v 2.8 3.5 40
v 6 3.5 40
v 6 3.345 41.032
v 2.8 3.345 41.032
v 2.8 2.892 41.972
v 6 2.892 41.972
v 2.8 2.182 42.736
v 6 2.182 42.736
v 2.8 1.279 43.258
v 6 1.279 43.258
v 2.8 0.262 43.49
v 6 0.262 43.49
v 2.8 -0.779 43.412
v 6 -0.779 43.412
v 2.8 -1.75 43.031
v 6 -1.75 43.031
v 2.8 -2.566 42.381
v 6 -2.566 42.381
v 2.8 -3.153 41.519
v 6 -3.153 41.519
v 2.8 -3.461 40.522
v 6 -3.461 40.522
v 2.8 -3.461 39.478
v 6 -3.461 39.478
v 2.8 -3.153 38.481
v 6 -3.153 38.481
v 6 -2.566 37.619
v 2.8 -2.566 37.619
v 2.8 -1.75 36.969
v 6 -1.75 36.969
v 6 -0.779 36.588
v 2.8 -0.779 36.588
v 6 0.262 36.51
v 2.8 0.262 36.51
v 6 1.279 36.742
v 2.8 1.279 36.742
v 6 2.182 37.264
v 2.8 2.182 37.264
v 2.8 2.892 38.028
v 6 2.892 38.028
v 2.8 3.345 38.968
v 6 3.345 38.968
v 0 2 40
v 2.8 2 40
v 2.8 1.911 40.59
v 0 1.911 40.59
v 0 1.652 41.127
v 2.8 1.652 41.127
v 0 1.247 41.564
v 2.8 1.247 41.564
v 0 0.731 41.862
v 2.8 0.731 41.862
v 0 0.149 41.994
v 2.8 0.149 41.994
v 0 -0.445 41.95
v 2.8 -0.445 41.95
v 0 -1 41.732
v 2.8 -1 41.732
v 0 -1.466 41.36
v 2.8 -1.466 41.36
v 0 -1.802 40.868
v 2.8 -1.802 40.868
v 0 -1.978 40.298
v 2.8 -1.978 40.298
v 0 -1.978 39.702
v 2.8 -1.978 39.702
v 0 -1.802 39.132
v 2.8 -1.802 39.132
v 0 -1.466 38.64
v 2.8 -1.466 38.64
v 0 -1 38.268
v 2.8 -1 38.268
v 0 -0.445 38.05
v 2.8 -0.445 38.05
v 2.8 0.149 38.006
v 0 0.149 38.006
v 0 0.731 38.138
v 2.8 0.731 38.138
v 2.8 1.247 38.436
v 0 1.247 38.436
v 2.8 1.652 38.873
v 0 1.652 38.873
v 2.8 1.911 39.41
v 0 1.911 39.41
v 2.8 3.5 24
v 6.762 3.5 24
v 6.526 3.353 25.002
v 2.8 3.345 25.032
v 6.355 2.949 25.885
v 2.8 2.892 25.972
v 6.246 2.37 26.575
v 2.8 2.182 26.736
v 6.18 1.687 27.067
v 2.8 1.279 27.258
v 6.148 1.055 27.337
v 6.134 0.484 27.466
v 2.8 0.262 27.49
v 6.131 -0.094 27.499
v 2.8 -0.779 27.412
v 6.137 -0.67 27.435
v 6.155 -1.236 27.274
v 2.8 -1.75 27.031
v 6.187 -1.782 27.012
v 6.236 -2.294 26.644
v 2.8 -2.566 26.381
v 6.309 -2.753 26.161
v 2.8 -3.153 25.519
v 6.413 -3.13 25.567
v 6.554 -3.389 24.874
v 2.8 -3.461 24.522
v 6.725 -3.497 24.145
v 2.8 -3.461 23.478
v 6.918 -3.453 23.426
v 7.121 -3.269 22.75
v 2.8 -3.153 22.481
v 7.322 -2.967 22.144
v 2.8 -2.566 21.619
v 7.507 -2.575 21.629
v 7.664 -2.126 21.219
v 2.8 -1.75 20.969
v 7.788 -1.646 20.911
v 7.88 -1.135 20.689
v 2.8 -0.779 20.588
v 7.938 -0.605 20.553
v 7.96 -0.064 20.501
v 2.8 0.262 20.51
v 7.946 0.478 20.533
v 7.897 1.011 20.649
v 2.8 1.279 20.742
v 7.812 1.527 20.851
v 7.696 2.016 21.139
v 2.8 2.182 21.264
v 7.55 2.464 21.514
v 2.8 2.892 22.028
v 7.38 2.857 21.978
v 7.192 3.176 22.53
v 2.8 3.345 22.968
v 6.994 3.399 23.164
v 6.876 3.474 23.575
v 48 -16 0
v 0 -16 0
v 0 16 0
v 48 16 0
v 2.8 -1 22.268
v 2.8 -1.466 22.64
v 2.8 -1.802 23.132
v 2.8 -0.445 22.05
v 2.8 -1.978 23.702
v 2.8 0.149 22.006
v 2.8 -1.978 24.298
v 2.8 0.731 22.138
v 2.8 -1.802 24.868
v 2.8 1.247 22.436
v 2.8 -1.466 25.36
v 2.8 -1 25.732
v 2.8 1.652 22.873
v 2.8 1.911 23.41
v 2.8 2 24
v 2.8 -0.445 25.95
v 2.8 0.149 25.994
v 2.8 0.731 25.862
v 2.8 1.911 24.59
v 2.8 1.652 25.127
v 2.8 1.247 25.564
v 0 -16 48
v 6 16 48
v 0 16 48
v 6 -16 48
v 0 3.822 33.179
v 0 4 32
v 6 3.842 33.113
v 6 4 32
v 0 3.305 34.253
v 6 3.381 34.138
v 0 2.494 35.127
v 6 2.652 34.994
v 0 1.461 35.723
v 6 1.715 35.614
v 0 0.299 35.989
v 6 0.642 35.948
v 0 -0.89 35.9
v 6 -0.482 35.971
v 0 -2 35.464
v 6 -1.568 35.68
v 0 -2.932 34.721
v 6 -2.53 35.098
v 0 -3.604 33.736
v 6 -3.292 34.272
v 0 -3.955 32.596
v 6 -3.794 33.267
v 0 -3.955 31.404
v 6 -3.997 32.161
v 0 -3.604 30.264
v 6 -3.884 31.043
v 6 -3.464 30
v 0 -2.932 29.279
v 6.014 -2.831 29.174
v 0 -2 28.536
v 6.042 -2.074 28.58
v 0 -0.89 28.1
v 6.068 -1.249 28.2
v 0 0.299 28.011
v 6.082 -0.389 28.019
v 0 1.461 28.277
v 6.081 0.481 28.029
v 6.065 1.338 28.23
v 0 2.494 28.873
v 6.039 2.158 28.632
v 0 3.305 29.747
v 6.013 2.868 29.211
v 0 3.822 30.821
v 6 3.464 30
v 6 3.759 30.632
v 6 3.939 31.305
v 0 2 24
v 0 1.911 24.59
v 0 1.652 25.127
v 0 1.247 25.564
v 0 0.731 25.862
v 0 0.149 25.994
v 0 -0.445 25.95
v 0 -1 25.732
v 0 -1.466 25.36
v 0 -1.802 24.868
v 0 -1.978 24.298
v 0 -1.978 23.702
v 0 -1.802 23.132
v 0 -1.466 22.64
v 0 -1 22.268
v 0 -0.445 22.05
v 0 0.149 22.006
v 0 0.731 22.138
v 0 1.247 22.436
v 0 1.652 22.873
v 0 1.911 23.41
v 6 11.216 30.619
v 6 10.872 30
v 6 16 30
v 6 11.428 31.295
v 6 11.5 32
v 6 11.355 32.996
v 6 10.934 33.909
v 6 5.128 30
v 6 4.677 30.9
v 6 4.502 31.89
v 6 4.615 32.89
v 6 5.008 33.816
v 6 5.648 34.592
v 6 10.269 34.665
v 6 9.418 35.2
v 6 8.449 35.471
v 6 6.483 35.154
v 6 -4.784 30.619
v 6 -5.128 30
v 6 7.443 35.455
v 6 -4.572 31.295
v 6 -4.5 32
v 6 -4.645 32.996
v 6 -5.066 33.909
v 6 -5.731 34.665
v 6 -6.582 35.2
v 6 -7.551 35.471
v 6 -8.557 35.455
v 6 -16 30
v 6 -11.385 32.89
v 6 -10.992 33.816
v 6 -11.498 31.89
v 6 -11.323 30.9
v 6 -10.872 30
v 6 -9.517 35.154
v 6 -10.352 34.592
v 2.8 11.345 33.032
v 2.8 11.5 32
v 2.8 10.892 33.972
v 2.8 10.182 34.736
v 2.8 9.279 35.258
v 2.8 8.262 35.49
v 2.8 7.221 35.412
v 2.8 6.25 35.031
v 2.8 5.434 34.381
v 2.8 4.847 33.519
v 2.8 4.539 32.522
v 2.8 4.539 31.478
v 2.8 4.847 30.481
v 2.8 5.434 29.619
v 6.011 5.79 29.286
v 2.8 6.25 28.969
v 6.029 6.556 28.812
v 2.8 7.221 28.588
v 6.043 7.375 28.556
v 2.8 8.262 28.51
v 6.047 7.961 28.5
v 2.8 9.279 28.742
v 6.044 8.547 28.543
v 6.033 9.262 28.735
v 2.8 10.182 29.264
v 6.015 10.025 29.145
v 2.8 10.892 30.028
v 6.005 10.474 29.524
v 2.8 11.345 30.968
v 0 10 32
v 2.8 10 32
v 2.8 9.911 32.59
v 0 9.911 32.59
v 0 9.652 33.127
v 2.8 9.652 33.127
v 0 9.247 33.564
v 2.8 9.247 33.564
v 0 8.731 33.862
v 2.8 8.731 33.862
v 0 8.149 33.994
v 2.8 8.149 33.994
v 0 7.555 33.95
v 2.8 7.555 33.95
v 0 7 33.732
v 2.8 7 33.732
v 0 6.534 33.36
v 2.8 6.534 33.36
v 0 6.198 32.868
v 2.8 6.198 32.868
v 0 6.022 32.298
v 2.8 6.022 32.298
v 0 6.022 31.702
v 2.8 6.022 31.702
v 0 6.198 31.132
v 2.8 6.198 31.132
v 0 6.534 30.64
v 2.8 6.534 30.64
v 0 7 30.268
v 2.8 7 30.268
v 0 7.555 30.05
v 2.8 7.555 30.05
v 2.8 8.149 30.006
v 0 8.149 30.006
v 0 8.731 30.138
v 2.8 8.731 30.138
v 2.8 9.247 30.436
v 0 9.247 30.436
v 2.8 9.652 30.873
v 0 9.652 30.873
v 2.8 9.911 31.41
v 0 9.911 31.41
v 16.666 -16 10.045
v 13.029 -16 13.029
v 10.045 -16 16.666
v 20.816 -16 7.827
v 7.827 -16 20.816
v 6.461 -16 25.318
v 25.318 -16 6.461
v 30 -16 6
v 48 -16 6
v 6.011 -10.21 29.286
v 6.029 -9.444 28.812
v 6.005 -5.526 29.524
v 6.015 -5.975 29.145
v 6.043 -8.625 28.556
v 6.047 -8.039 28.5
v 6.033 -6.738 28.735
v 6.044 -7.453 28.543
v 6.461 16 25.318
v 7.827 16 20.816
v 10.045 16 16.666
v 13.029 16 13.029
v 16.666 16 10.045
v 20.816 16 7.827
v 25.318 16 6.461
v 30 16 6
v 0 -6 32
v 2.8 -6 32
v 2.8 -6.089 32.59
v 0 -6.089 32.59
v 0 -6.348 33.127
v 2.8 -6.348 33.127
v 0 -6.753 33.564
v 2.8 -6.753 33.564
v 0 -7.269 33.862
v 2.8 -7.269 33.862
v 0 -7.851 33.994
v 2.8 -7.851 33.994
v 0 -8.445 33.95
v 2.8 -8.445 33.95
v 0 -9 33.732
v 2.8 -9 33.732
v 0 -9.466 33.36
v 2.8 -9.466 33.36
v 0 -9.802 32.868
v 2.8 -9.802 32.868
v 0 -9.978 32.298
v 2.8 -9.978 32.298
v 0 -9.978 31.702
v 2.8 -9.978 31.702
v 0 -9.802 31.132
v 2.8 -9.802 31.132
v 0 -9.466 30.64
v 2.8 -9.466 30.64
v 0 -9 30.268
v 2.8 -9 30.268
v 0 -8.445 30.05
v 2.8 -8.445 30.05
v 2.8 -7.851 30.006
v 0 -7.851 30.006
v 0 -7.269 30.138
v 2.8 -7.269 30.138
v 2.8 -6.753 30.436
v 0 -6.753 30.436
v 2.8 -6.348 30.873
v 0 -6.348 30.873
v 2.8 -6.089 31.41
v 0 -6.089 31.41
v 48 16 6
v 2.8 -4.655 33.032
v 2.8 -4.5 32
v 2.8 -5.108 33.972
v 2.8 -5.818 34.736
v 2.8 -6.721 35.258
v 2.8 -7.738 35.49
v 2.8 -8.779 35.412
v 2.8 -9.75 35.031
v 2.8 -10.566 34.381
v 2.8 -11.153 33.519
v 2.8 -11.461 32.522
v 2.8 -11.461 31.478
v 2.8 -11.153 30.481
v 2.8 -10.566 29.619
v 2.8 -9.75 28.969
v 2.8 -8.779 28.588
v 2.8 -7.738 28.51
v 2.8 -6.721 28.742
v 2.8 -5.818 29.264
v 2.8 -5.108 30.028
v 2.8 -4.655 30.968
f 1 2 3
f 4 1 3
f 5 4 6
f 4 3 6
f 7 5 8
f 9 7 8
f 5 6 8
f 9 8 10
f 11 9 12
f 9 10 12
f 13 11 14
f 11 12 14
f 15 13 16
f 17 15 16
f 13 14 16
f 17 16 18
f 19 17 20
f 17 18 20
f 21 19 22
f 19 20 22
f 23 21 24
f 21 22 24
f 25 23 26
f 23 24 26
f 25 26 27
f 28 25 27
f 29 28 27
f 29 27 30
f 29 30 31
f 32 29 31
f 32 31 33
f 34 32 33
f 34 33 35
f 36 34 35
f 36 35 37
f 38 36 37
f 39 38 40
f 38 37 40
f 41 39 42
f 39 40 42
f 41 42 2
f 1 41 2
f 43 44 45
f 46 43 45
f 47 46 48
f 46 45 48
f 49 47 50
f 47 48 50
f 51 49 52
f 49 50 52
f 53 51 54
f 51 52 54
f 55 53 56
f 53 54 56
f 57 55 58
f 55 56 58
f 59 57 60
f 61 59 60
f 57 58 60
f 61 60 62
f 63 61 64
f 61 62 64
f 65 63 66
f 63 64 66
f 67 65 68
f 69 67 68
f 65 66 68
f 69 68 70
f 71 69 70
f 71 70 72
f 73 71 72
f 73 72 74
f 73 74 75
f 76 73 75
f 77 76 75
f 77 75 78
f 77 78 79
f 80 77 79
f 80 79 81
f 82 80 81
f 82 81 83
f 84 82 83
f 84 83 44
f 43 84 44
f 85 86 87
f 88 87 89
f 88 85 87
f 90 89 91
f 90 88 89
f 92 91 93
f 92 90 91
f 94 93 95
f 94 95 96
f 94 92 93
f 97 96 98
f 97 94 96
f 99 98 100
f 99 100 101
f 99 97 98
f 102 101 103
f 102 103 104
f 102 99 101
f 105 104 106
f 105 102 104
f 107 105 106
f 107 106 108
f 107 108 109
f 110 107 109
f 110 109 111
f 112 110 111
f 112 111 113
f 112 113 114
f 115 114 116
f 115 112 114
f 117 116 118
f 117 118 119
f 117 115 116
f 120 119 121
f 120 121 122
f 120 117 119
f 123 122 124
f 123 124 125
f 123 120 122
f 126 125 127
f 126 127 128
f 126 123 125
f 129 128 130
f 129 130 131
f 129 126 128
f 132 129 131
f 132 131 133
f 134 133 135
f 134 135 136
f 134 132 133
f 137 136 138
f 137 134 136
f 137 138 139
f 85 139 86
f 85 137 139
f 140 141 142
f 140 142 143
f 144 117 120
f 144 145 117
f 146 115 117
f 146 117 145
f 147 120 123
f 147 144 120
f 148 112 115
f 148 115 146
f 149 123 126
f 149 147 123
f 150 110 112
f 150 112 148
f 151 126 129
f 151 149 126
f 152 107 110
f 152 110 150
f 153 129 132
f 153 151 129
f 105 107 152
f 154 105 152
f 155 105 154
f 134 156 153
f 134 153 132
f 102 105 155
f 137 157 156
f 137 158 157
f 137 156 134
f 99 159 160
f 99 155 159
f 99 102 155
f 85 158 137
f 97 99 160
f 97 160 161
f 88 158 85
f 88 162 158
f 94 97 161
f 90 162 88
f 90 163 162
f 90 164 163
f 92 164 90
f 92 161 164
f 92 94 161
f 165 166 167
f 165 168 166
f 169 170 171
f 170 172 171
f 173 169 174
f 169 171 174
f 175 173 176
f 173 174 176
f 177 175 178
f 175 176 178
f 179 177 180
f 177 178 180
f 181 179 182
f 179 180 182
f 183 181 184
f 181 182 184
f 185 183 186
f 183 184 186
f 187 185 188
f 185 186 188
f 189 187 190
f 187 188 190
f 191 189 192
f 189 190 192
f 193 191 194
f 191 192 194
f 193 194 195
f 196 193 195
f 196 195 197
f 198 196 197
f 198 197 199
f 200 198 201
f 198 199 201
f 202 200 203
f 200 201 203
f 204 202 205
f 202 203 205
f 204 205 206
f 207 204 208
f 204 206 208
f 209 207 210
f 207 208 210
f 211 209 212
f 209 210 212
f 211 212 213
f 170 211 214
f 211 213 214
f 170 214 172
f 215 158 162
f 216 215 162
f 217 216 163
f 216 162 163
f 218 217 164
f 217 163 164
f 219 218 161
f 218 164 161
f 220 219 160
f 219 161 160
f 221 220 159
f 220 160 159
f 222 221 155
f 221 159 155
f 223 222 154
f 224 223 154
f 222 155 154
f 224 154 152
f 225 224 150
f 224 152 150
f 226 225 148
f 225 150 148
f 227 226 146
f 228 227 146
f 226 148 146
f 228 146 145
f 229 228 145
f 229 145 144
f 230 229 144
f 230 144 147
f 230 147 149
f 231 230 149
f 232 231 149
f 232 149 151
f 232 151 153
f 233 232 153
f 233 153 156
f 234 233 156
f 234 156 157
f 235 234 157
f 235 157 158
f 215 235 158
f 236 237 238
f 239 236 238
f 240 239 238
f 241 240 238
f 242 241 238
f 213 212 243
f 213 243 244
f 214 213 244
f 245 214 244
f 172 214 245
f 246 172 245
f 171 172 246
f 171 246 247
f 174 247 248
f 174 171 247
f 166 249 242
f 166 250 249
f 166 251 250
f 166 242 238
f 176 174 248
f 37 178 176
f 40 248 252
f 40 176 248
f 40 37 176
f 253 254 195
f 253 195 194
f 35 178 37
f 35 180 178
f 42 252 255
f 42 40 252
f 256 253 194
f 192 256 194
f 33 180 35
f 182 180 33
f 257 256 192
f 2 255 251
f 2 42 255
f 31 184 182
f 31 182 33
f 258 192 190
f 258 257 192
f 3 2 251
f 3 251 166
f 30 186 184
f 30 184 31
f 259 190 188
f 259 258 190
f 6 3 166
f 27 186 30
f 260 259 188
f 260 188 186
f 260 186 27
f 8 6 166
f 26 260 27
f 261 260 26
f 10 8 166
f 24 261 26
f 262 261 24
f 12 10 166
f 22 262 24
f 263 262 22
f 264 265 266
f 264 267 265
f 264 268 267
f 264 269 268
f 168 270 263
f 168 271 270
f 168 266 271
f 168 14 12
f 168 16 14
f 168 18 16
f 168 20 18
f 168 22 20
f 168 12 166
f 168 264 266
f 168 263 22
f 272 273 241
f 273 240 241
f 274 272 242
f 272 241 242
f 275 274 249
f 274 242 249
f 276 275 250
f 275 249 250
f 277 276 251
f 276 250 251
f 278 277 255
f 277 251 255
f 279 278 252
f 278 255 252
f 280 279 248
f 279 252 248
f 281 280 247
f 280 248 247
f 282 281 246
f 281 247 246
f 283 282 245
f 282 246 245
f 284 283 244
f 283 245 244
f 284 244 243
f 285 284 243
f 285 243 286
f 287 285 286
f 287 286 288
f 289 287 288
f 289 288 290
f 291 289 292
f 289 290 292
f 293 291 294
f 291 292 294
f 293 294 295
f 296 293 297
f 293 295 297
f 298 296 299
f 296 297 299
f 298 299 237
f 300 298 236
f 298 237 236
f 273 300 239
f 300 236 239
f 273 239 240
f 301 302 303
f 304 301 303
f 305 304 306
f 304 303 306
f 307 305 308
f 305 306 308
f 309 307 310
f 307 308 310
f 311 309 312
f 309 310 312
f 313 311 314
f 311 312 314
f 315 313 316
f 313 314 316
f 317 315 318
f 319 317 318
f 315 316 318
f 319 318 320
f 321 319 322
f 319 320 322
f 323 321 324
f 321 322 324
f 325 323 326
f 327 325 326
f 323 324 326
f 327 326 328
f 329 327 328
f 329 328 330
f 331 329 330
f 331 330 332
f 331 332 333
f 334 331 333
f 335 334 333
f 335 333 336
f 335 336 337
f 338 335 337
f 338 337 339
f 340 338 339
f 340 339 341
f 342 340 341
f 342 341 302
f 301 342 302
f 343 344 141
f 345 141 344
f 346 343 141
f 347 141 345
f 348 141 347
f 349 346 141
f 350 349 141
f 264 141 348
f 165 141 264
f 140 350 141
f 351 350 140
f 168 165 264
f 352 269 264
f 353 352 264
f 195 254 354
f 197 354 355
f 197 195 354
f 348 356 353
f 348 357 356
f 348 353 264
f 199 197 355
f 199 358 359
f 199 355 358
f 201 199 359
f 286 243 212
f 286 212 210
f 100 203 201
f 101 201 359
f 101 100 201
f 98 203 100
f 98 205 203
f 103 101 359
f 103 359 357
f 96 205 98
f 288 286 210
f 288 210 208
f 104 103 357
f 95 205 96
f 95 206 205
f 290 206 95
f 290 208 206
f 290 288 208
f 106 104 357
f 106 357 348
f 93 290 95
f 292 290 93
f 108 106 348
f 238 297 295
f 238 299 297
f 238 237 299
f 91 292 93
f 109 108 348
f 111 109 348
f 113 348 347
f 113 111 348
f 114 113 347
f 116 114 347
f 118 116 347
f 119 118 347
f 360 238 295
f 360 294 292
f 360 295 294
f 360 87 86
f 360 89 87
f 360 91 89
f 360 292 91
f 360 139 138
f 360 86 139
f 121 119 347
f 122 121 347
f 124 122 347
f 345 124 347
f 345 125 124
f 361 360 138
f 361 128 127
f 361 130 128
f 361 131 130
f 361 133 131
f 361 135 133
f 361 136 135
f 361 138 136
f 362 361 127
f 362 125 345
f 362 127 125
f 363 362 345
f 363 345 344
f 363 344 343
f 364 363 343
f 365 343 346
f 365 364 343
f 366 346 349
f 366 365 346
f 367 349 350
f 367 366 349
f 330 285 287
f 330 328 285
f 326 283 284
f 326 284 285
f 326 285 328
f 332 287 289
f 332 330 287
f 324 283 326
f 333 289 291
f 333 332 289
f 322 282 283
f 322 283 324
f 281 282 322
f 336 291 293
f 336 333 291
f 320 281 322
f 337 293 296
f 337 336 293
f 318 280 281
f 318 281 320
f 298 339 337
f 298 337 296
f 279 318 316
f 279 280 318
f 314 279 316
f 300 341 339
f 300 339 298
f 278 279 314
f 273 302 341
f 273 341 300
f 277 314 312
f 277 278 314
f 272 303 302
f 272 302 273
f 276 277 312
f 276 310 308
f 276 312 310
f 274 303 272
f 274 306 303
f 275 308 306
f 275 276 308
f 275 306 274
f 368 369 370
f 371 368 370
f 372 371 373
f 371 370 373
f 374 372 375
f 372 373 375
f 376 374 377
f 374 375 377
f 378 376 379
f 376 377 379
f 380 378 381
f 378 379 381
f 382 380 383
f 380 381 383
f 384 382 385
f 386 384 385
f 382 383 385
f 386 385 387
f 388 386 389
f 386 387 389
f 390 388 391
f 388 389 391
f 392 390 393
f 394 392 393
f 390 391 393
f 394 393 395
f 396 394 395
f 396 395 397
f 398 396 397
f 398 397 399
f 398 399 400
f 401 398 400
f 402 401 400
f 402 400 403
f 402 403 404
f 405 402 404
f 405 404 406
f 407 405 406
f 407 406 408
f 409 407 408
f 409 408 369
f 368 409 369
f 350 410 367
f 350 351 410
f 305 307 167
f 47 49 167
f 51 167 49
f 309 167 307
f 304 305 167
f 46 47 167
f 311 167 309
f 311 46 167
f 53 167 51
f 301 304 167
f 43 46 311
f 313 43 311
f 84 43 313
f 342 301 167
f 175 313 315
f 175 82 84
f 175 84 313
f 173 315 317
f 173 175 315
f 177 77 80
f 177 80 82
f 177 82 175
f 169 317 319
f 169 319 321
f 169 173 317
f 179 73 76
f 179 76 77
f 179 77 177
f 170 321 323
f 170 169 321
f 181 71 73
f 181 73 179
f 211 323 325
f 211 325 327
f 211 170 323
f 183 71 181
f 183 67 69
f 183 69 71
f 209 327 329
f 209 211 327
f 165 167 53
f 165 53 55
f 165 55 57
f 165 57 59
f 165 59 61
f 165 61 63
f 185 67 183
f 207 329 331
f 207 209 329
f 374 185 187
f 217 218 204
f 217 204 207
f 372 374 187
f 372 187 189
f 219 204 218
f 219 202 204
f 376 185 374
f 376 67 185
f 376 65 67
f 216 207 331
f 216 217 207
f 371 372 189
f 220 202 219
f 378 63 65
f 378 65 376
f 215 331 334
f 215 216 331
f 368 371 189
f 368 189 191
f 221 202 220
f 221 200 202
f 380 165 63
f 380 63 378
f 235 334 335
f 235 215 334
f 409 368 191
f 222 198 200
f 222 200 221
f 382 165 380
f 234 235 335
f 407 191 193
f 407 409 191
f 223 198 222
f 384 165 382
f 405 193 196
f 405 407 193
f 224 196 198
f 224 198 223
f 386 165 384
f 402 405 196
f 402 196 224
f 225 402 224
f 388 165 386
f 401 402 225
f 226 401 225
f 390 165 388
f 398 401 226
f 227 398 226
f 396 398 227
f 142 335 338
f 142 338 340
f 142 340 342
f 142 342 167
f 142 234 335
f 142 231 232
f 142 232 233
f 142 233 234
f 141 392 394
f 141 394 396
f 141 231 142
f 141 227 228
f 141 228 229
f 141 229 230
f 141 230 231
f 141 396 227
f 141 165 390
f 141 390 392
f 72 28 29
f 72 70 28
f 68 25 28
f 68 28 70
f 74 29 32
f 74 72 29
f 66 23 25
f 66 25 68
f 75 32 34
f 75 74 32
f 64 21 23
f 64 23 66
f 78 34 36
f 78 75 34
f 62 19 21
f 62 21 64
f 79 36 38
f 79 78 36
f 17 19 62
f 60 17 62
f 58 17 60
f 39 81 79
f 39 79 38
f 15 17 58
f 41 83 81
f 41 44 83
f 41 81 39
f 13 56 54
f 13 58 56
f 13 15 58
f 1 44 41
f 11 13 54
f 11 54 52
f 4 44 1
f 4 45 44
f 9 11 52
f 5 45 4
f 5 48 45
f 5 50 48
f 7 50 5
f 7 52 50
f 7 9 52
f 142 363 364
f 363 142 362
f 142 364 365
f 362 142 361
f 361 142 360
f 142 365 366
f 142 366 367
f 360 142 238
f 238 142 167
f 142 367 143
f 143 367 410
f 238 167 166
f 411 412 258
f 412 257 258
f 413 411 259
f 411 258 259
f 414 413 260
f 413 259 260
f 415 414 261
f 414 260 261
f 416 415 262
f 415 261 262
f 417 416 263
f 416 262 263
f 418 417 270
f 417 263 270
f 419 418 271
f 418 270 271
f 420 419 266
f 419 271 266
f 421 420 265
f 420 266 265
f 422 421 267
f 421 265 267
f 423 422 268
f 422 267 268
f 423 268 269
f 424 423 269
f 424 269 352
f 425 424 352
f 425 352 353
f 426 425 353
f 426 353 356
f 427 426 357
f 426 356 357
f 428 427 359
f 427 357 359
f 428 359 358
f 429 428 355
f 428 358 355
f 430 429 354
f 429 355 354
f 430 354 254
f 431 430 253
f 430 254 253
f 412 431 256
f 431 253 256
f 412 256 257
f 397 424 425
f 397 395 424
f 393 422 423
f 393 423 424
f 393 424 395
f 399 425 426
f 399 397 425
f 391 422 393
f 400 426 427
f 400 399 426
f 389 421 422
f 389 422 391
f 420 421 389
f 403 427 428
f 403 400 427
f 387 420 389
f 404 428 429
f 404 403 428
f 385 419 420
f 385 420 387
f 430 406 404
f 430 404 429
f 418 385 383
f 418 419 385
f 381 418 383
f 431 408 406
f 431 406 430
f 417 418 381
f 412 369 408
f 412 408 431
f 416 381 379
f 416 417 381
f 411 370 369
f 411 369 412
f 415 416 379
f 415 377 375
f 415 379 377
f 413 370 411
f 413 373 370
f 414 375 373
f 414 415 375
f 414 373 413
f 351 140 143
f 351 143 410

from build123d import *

# Parameters (mm, degrees)
F5_DEPTH      = 16
F7_R          = 24
F6_R          = 2
F6_R_2        = 4
F8_DEPTH      = 6.001
F8_DEPTH_BACK = 42.001
F6_R_3        = 3.5
F9_DEPTH      = 3.2
F9_DEPTH_BACK = 42.001


with BuildPart() as f5:
    # F4 (on Front) → F5 (new body, symmetric)
    with BuildSketch(Plane.XZ):
        Polygon((6, 48), (0, 48), (0, 0), (48, 0), (48, 6), (6, 6), align=None)
    extrude(amount=F5_DEPTH, both=True)

    # F7
    f7_edges = [f5.edges().sort_by_distance(p)[0] for p in [
        (6, 0, 6),
    ]]
    fillet(f7_edges, radius=F7_R)

    # F6 (on face) → F8 (cut, two sides)
    with BuildSketch(Plane.YZ.offset(6)) as f8_sk:
        with Locations((-8, 32)):
            Circle(F6_R)
        with Locations((0, 40)):
            Circle(F6_R)
        with Locations((8, 32)):
            Circle(F6_R)
        with Locations((0, 32)):
            Circle(F6_R_2)
        with Locations((0, 24)):
            Circle(F6_R)
    extrude(amount=-F8_DEPTH, mode=Mode.SUBTRACT)
    extrude(f8_sk.sketch, amount=F8_DEPTH_BACK, mode=Mode.SUBTRACT)

    # F6 (on face) → F9 (cut, two sides)
    with BuildSketch(Plane.YZ.offset(6)) as f9_sk:
        with Locations((-8, 32)):
            Circle(F6_R_3)
        with Locations((-8, 32)):
            Circle(F6_R, mode=Mode.SUBTRACT)
        with Locations((0, 40)):
            Circle(F6_R_3)
        with Locations((0, 40)):
            Circle(F6_R, mode=Mode.SUBTRACT)
        with Locations((8, 32)):
            Circle(F6_R_3)
        with Locations((8, 32)):
            Circle(F6_R, mode=Mode.SUBTRACT)
        with Locations((0, 24)):
            Circle(F6_R_3)
        with Locations((0, 24)):
            Circle(F6_R, mode=Mode.SUBTRACT)
    extrude(amount=-F9_DEPTH, mode=Mode.SUBTRACT)
    extrude(f9_sk.sketch, amount=F9_DEPTH_BACK, mode=Mode.SUBTRACT)


solid = f5.part
